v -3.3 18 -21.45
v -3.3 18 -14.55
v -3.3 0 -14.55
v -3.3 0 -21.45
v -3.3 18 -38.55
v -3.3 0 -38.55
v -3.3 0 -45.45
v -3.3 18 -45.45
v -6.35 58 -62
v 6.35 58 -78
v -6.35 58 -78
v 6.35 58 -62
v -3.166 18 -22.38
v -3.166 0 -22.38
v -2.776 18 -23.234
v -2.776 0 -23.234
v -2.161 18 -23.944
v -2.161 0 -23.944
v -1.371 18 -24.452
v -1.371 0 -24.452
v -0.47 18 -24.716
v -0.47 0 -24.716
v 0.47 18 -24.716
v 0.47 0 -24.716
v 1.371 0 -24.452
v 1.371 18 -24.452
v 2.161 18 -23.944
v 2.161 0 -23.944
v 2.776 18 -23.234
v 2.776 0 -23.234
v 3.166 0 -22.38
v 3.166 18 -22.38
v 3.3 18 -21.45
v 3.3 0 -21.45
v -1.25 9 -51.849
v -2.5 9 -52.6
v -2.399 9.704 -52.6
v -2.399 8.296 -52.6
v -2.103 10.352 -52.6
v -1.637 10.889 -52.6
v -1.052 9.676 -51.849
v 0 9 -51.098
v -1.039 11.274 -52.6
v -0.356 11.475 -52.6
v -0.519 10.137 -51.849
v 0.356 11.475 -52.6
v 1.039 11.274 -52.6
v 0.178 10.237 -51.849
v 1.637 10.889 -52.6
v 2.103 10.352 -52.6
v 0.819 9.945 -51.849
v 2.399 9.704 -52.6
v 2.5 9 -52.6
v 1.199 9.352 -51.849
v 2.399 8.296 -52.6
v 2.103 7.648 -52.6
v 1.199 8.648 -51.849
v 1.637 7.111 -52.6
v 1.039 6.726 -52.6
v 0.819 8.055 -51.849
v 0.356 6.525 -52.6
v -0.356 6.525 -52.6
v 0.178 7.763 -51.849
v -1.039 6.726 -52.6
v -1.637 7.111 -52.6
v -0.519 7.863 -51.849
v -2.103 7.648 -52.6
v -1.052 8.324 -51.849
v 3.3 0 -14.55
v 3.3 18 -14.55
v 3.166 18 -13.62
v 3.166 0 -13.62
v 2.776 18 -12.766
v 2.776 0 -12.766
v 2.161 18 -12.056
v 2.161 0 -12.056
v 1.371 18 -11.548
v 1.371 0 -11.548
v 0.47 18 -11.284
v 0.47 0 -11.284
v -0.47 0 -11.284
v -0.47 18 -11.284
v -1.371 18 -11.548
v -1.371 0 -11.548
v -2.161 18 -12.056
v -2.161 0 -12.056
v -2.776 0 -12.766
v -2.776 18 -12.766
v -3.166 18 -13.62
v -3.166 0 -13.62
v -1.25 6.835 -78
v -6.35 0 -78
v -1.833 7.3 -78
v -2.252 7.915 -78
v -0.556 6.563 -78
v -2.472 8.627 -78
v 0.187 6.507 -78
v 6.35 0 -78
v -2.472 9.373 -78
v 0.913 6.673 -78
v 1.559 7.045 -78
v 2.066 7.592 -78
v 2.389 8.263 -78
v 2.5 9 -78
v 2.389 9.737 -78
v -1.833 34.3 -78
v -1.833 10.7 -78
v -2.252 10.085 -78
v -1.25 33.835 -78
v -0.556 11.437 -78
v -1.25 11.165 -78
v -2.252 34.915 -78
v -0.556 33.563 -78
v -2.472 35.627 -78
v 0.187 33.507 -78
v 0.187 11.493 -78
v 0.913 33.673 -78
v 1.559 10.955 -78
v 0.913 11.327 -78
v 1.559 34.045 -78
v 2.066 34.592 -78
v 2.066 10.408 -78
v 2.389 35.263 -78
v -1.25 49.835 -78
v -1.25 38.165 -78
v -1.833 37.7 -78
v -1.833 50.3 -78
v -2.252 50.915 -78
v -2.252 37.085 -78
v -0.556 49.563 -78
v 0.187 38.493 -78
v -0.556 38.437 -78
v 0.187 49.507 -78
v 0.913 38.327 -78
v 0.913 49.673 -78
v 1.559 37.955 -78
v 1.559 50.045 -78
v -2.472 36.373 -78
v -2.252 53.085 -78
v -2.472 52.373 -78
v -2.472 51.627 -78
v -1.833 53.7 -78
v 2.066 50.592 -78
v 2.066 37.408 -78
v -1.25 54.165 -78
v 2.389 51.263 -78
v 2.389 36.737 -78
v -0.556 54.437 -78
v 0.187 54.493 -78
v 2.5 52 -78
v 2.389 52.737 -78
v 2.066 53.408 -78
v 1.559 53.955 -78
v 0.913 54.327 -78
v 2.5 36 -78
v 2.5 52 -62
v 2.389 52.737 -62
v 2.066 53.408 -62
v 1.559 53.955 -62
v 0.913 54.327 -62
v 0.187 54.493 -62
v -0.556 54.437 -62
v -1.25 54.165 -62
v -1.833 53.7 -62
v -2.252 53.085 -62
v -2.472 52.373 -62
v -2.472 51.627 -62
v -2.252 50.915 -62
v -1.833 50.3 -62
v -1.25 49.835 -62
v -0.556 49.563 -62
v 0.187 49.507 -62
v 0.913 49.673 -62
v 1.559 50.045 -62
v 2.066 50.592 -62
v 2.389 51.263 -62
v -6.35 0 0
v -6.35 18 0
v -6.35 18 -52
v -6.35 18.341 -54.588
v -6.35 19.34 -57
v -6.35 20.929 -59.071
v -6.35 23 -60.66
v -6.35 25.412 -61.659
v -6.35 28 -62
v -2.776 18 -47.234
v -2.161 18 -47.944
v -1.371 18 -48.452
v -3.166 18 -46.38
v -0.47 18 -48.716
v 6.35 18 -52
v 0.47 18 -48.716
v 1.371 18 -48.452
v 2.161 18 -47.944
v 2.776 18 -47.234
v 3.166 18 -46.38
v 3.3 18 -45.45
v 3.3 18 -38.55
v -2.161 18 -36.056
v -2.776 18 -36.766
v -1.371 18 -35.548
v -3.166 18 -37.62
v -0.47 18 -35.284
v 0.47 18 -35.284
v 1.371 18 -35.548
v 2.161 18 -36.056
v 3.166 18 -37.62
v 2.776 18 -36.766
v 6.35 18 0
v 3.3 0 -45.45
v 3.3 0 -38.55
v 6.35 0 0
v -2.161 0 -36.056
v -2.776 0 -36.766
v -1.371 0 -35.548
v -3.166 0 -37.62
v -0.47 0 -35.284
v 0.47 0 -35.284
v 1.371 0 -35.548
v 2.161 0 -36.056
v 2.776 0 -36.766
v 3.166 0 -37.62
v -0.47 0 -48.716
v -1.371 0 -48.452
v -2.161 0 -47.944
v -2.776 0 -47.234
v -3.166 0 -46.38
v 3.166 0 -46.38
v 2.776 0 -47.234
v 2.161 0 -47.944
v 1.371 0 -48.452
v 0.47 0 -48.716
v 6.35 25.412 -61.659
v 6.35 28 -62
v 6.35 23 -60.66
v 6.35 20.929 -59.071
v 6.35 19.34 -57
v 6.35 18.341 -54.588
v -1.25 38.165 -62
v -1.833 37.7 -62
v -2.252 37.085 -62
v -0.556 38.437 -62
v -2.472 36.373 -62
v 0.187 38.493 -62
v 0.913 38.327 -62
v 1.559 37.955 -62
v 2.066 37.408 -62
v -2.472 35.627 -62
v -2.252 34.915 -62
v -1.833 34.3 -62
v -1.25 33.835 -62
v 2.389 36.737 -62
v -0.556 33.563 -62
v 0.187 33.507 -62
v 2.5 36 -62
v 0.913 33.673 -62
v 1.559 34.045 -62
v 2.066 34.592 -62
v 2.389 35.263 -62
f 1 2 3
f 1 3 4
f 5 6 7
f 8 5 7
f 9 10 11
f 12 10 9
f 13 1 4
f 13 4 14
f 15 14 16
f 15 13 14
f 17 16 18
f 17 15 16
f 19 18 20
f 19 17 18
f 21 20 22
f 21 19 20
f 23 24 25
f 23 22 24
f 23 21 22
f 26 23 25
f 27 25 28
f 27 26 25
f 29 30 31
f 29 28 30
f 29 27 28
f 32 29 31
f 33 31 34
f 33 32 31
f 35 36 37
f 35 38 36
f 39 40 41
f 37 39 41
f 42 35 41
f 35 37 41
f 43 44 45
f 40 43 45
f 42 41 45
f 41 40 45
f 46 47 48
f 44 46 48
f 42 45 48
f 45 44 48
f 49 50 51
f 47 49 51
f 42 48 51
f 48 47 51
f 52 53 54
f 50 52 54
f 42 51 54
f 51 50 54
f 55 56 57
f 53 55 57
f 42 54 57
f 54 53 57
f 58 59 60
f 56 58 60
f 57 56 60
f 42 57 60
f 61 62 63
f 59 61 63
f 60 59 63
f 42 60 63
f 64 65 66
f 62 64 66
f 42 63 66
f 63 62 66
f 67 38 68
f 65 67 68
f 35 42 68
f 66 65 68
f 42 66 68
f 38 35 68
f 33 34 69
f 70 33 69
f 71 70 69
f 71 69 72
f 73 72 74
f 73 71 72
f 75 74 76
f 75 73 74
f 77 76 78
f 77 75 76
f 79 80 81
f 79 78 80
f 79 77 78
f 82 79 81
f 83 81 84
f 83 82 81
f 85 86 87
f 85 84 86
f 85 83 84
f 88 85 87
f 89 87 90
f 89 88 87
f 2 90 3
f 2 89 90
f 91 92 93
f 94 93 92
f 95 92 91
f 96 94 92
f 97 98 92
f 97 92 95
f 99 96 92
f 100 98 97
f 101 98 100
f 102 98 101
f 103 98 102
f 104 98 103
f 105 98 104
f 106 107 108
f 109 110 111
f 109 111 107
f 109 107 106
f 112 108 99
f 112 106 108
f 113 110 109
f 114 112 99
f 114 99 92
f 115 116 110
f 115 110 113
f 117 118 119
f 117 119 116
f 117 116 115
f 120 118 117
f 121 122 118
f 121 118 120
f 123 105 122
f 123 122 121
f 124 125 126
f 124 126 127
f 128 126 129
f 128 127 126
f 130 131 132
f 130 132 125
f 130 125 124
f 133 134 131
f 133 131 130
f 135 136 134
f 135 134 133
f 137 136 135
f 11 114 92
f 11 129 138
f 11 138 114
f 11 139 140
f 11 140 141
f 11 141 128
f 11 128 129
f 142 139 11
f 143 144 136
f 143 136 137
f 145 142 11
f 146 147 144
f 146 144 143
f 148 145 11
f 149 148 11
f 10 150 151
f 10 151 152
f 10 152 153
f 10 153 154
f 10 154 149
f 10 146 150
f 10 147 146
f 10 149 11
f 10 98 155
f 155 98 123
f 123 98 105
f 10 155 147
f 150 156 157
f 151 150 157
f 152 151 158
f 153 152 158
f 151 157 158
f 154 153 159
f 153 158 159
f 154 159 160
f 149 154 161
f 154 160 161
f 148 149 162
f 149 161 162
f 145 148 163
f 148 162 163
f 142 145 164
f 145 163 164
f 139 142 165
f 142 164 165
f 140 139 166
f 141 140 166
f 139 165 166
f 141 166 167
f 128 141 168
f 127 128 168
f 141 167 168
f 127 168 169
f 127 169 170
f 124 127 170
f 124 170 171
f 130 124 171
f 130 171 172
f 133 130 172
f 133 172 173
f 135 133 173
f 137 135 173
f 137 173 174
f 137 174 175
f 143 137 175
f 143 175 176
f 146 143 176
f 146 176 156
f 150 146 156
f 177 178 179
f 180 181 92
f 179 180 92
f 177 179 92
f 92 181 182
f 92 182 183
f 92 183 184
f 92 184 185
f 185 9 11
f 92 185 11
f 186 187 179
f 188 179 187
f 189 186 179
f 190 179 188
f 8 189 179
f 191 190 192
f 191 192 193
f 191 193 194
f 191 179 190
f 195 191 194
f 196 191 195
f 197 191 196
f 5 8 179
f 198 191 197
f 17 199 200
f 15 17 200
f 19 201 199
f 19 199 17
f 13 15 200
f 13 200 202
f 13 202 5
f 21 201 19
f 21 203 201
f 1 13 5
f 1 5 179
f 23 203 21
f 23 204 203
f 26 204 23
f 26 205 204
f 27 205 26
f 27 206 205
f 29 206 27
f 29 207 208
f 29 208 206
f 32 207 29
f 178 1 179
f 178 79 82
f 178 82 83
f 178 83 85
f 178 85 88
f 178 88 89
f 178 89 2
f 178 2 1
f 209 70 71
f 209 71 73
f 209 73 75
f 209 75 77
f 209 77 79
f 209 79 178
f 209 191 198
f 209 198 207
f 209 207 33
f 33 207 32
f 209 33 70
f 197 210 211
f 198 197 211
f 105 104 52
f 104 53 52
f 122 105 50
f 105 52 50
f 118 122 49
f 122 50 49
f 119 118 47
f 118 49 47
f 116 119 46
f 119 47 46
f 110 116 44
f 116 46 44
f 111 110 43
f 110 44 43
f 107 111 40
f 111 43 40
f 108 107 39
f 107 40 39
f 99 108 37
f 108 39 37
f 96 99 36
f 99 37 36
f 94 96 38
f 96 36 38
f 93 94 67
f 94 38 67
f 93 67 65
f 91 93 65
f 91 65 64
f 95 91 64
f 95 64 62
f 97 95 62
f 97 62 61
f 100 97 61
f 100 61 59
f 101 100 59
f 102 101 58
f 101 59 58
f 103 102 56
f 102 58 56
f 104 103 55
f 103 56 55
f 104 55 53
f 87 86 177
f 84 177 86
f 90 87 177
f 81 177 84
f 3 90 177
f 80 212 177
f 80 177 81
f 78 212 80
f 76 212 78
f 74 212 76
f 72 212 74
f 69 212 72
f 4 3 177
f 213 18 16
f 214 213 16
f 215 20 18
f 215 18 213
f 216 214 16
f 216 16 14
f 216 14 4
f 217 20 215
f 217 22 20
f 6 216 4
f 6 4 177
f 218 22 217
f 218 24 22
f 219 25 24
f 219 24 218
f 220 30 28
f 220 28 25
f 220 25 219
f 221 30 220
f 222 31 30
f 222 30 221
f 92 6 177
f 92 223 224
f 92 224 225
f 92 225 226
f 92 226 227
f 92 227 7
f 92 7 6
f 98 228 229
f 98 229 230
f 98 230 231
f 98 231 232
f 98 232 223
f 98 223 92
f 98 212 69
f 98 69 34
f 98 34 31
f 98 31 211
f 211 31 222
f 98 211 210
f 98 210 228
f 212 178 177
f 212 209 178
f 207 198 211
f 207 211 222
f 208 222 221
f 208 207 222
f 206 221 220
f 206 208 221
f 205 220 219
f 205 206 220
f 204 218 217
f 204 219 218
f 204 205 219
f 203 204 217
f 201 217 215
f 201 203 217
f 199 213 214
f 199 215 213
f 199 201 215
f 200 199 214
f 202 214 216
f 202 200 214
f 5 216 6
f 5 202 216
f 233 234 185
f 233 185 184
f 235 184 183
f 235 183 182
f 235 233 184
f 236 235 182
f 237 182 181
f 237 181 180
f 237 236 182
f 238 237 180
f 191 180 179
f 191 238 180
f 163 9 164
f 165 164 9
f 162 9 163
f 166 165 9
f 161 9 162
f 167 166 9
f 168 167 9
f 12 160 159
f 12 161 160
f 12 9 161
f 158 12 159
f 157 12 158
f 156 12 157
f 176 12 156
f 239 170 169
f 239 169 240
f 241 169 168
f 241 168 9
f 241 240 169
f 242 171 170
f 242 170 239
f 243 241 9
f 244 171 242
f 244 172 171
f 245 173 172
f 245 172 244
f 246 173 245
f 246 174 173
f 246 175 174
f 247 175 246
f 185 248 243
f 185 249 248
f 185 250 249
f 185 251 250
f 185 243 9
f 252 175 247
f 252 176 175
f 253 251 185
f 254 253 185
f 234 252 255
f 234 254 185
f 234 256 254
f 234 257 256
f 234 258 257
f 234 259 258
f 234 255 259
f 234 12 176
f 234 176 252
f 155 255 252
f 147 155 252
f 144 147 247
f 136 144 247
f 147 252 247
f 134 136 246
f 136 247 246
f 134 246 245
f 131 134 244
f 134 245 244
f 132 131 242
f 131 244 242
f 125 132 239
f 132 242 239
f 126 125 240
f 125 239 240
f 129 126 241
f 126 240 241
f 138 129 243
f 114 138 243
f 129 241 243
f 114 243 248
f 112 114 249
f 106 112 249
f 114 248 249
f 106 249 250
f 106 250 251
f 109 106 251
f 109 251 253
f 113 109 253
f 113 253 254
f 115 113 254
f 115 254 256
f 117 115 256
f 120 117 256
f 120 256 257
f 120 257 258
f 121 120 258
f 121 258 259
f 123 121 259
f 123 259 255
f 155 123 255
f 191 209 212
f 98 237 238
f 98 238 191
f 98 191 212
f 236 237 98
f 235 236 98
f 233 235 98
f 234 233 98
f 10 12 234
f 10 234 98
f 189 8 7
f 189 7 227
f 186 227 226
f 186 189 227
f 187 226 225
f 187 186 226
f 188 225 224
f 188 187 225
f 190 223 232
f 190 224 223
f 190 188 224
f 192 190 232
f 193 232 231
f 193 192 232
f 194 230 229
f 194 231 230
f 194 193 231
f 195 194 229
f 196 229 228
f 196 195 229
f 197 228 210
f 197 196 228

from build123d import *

# Parameters (mm, degrees)
BOSS_EXTRUDE1_DEPTH   = 6.35
M6_TAPPED_HOLE1_D     = 5
M6_TAPPED_HOLE1_DEPTH = 25.4
M6_TAPPED_HOLE1_TIP   = 1.502151548
M6_TAPPED_HOLE2_D     = 5
CUT_EXTRUDE1_DEPTH    = 88.888124909


with BuildPart() as part:
    # Sketch1 → Boss-Extrude1 (new, symmetric)
    with BuildSketch(Plane(origin=(0, 0, 0), x_dir=(0, 0, -1), z_dir=(1, 0, 0))):
        with BuildLine():
            Line((0, 0), (78, 0))
            Line((78, 0), (78, 58))
            Line((78, 58), (62, 58))
            Line((62, 58), (62, 28))
            ThreePointArc((62, 28), (59.071067812, 20.928932188), (52, 18))
            Line((52, 18), (0, 18))
            Line((0, 18), (0, 0))
        make_face()
    extrude(amount=BOSS_EXTRUDE1_DEPTH, both=True)

    # M6 Tapped Hole1
    with Locations(Plane(origin=(0, 0, -78), x_dir=(-1, 0, 0), z_dir=(0, 0, -1))):
        with Locations((0, 9), (0, 36)):
            Hole(M6_TAPPED_HOLE1_D / 2, depth=M6_TAPPED_HOLE1_DEPTH)
            with Locations((0, 0, -(M6_TAPPED_HOLE1_DEPTH + M6_TAPPED_HOLE1_TIP / 2))):  # 118° drill point
                Cone(0, M6_TAPPED_HOLE1_D / 2, M6_TAPPED_HOLE1_TIP, mode=Mode.SUBTRACT)

    # M6 Tapped Hole2 (through all)
    with Locations(Plane(origin=(0, 0, -78), x_dir=(-1, 0, 0), z_dir=(0, 0, -1))):
        with Locations((0, 52)):
            Hole(M6_TAPPED_HOLE2_D / 2)

    # Sketch4 → Cut-Extrude1 (cut, through all)
    with BuildSketch(Plane(origin=(0, 18, 0), x_dir=(1, 0, 0), z_dir=(0, 1, 0))):
        with BuildLine():
            Line((3.3, 45.45), (3.3, 38.55))
            ThreePointArc((3.3, 38.55), (0, 35.25), (-3.3, 38.55))
            Line((-3.3, 38.55), (-3.3, 45.45))
            ThreePointArc((-3.3, 45.45), (0, 48.75), (3.3, 45.45))
        make_face()
        with BuildLine():
            Line((3.3, 21.45), (3.3, 14.55))
            ThreePointArc((3.3, 14.55), (0, 11.25), (-3.3, 14.55))
            Line((-3.3, 14.55), (-3.3, 21.45))
            ThreePointArc((-3.3, 21.45), (0, 24.75), (3.3, 21.45))
        make_face()
    extrude(amount=-CUT_EXTRUDE1_DEPTH, mode=Mode.SUBTRACT)


solid = part.part
